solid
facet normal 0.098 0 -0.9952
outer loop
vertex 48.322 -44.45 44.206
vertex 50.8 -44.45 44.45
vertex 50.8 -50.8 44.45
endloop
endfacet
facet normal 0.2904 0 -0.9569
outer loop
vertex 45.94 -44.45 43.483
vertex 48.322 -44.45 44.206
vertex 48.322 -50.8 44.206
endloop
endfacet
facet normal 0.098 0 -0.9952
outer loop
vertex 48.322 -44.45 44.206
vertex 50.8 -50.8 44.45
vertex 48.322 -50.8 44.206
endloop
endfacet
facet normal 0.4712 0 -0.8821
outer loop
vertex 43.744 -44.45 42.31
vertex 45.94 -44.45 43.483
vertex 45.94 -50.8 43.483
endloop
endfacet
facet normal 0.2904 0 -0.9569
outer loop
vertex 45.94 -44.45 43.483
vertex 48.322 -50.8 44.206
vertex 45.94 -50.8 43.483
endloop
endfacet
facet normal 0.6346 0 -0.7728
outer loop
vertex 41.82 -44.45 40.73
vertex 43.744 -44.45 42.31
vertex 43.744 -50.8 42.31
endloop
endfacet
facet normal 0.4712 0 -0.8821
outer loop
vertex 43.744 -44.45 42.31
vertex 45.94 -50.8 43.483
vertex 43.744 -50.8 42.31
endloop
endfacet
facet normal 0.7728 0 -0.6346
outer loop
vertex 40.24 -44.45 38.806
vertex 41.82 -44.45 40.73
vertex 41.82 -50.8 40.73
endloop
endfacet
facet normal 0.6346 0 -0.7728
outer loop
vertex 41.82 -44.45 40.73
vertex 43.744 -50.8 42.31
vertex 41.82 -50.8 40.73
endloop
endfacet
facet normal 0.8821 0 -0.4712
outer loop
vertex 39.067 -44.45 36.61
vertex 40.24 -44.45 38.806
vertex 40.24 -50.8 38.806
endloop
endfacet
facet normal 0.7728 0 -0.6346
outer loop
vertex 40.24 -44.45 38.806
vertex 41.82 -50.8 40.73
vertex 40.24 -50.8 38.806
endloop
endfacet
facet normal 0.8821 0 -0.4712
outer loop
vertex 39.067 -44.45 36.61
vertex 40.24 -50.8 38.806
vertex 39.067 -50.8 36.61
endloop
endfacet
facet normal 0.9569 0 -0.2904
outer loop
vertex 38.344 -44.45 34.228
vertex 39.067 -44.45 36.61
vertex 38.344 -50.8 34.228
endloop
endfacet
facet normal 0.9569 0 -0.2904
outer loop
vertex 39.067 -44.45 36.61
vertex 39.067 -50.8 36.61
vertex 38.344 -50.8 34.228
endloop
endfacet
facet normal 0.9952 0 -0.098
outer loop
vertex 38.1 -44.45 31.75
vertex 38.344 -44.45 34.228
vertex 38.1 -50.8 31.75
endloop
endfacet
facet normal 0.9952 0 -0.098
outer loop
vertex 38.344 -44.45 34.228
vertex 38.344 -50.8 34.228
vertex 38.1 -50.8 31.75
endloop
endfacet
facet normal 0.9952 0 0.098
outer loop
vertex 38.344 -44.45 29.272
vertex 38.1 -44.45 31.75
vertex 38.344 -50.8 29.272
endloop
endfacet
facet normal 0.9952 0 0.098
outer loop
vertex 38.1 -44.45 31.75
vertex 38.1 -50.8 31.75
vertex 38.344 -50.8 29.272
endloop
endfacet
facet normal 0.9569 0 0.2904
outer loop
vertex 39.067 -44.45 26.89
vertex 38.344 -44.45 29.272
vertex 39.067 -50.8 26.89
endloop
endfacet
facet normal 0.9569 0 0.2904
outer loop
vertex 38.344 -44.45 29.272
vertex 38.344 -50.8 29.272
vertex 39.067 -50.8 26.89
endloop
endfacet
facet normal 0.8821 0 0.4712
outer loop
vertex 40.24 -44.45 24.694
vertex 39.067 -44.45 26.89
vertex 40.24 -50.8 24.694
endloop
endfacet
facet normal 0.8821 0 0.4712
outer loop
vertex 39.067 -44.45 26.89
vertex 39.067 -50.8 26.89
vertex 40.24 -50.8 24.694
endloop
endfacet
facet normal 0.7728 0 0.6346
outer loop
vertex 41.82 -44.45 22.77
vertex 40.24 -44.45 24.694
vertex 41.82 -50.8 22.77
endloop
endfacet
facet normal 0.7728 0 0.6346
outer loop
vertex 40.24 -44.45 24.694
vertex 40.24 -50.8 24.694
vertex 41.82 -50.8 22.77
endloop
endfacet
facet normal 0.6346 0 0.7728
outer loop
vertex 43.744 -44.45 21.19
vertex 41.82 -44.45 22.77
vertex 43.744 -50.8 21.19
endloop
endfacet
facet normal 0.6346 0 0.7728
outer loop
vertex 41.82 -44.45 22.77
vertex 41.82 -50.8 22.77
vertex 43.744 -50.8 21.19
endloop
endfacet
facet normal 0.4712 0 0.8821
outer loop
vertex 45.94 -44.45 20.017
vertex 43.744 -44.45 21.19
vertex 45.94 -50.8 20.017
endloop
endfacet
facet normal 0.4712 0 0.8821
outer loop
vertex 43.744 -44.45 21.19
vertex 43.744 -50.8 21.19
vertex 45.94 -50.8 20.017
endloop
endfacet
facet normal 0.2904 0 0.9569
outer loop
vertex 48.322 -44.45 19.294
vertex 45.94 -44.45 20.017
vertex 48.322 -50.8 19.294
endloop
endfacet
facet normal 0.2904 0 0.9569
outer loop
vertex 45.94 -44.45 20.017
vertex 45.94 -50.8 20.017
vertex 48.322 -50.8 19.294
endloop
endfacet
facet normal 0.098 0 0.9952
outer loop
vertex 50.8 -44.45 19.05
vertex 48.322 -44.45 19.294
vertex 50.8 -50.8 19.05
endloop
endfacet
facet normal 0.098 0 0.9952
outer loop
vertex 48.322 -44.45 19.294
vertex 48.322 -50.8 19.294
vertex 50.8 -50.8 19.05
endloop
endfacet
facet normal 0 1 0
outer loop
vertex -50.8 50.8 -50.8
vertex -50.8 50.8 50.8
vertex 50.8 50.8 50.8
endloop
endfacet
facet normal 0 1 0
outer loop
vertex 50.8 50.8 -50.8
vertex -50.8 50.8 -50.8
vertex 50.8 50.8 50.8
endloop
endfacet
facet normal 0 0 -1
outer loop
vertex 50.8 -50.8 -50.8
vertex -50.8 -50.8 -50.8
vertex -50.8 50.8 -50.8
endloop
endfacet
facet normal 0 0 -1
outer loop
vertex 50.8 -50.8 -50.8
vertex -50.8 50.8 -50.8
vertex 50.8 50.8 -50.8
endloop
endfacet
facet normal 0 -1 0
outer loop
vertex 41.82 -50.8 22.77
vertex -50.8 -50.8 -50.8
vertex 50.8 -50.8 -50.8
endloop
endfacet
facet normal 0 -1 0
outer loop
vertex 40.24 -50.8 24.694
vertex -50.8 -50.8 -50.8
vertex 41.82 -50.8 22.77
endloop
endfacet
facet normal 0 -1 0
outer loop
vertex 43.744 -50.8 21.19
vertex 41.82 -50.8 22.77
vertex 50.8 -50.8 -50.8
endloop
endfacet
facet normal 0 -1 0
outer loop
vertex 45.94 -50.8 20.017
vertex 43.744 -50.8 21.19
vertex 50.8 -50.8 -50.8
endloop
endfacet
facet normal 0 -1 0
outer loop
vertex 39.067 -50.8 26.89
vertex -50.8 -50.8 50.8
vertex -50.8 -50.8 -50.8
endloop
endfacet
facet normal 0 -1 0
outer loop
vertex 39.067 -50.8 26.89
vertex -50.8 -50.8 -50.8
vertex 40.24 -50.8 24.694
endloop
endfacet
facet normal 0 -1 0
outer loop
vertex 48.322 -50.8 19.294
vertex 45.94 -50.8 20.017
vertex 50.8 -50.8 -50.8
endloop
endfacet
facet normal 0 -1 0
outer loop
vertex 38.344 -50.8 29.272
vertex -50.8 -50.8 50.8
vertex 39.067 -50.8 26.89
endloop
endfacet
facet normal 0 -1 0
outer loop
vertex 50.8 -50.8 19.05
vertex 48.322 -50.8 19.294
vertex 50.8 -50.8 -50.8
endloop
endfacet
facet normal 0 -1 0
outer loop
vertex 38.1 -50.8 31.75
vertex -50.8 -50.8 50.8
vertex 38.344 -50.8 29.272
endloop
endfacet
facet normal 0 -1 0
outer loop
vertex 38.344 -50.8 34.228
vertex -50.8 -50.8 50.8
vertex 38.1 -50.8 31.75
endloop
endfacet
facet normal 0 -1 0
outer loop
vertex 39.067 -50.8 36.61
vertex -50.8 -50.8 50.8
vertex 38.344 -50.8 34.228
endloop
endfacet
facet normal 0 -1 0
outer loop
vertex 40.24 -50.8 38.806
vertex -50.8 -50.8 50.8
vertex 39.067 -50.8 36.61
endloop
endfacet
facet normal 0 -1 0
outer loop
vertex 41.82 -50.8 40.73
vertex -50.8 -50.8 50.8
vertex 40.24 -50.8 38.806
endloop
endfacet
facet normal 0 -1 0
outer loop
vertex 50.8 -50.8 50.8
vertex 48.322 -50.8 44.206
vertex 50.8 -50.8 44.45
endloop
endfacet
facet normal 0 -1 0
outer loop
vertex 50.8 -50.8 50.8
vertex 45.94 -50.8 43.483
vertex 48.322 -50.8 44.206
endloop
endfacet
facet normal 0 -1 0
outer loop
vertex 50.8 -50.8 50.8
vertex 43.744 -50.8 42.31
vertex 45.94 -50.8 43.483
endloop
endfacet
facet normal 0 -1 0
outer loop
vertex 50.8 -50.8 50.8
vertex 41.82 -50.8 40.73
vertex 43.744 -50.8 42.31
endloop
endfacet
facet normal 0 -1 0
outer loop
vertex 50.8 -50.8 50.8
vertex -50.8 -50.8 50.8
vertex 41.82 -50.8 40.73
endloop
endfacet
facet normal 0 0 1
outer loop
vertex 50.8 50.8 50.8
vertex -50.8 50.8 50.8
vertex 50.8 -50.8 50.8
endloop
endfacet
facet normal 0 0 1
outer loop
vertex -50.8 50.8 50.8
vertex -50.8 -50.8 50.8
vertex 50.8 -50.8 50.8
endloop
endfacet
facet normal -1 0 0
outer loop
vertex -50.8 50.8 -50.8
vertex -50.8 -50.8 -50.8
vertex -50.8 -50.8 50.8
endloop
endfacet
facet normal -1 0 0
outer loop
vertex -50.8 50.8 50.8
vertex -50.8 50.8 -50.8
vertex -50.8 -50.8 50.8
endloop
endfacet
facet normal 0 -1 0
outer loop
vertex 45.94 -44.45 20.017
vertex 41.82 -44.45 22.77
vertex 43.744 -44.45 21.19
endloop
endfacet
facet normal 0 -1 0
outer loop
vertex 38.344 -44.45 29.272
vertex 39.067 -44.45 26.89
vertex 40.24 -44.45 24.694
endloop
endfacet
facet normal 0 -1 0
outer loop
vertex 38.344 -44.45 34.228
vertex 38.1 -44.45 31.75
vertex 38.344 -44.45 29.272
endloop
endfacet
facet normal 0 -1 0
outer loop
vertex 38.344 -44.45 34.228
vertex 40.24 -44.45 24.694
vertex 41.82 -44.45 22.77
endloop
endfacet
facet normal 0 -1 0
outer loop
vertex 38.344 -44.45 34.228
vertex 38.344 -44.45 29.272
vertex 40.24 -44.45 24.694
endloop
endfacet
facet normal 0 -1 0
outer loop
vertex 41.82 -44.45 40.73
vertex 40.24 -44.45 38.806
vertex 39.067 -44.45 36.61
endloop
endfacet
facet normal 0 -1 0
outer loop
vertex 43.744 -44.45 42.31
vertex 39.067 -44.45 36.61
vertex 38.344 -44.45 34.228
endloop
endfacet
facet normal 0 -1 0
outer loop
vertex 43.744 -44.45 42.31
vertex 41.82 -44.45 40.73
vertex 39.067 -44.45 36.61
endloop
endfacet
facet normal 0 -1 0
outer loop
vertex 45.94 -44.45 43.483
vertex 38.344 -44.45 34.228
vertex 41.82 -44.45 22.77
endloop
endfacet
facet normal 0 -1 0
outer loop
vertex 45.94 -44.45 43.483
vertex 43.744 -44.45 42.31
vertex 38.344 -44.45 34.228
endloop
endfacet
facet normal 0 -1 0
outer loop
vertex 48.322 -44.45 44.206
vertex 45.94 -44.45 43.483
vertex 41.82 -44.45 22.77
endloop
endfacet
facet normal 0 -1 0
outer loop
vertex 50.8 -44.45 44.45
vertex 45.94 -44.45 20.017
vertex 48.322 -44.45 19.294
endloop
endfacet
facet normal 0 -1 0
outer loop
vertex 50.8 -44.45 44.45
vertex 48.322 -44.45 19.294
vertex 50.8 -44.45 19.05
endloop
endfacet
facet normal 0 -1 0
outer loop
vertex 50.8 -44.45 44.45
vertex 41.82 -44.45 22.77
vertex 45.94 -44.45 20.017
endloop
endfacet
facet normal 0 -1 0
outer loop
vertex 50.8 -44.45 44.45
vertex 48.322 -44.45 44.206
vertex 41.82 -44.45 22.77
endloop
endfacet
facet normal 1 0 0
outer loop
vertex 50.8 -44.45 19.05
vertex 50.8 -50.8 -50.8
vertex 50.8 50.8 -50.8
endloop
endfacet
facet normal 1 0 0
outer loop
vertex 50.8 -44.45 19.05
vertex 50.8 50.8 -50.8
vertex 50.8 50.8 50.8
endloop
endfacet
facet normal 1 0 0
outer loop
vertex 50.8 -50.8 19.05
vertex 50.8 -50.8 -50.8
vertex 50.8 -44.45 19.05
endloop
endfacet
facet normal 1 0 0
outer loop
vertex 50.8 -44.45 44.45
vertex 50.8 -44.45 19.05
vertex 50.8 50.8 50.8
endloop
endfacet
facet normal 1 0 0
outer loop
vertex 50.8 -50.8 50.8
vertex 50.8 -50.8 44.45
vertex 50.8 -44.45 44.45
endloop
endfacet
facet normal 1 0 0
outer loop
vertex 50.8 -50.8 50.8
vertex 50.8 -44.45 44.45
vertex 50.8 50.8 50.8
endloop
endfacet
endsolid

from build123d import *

# Parameters (mm, degrees)
F0_W     = 101.6
F0_H     = 101.6
F1_DEPTH = 50.8
F2_R     = 12.7
F3_DEPTH = 6.35


with BuildPart() as f1:
    # F0 (on Front) → F1 (new body, symmetric)
    with BuildSketch(Plane.XZ):
        Rectangle(F0_W, F0_H)
    extrude(amount=F1_DEPTH, both=True)

    # F2 (on face) → F3 (cut)
    with BuildSketch(Plane.XZ.offset(50.8)):
        with Locations((50.8, 31.75)):
            Circle(F2_R)
    extrude(amount=-F3_DEPTH, mode=Mode.SUBTRACT)


solid = f1.part
